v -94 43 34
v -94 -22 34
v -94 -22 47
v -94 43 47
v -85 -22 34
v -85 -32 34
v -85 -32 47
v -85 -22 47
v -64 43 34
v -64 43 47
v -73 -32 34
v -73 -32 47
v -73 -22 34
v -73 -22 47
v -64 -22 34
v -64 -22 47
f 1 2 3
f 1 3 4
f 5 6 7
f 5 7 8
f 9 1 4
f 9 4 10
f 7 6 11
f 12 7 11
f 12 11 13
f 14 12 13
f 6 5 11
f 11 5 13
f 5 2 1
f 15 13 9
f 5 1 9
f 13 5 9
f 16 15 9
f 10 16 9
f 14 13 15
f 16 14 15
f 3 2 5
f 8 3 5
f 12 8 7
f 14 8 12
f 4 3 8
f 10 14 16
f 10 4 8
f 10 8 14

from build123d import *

# Parameters (mm, degrees)
BOX325_W     = 12
BOX325_H     = 10
BOX325_DEPTH = 13
BOX297_W     = 30
BOX297_H     = 65
BOX297_DEPTH = 13


with BuildPart() as box325:
    # Box325 → Box325 (new body)
    with BuildSketch(Plane(origin=(-85, -32, 34), x_dir=(1, 0, 0), z_dir=(0, 0, 1))):
        with Locations((6, 5)):
            Rectangle(BOX325_W, BOX325_H)
    extrude(amount=BOX325_DEPTH)


with BuildPart() as coral:
    # Box297 → Box297 (new body)
    with BuildSketch(Plane(origin=(-94, -22, 34), x_dir=(1, 0, 0), z_dir=(0, 0, 1))):
        with Locations((15, 32.5)):
            Rectangle(BOX297_W, BOX297_H)
    extrude(amount=BOX297_DEPTH)

    # Fusion197: union Box325
    add(box325.part)


solid = coral.part
